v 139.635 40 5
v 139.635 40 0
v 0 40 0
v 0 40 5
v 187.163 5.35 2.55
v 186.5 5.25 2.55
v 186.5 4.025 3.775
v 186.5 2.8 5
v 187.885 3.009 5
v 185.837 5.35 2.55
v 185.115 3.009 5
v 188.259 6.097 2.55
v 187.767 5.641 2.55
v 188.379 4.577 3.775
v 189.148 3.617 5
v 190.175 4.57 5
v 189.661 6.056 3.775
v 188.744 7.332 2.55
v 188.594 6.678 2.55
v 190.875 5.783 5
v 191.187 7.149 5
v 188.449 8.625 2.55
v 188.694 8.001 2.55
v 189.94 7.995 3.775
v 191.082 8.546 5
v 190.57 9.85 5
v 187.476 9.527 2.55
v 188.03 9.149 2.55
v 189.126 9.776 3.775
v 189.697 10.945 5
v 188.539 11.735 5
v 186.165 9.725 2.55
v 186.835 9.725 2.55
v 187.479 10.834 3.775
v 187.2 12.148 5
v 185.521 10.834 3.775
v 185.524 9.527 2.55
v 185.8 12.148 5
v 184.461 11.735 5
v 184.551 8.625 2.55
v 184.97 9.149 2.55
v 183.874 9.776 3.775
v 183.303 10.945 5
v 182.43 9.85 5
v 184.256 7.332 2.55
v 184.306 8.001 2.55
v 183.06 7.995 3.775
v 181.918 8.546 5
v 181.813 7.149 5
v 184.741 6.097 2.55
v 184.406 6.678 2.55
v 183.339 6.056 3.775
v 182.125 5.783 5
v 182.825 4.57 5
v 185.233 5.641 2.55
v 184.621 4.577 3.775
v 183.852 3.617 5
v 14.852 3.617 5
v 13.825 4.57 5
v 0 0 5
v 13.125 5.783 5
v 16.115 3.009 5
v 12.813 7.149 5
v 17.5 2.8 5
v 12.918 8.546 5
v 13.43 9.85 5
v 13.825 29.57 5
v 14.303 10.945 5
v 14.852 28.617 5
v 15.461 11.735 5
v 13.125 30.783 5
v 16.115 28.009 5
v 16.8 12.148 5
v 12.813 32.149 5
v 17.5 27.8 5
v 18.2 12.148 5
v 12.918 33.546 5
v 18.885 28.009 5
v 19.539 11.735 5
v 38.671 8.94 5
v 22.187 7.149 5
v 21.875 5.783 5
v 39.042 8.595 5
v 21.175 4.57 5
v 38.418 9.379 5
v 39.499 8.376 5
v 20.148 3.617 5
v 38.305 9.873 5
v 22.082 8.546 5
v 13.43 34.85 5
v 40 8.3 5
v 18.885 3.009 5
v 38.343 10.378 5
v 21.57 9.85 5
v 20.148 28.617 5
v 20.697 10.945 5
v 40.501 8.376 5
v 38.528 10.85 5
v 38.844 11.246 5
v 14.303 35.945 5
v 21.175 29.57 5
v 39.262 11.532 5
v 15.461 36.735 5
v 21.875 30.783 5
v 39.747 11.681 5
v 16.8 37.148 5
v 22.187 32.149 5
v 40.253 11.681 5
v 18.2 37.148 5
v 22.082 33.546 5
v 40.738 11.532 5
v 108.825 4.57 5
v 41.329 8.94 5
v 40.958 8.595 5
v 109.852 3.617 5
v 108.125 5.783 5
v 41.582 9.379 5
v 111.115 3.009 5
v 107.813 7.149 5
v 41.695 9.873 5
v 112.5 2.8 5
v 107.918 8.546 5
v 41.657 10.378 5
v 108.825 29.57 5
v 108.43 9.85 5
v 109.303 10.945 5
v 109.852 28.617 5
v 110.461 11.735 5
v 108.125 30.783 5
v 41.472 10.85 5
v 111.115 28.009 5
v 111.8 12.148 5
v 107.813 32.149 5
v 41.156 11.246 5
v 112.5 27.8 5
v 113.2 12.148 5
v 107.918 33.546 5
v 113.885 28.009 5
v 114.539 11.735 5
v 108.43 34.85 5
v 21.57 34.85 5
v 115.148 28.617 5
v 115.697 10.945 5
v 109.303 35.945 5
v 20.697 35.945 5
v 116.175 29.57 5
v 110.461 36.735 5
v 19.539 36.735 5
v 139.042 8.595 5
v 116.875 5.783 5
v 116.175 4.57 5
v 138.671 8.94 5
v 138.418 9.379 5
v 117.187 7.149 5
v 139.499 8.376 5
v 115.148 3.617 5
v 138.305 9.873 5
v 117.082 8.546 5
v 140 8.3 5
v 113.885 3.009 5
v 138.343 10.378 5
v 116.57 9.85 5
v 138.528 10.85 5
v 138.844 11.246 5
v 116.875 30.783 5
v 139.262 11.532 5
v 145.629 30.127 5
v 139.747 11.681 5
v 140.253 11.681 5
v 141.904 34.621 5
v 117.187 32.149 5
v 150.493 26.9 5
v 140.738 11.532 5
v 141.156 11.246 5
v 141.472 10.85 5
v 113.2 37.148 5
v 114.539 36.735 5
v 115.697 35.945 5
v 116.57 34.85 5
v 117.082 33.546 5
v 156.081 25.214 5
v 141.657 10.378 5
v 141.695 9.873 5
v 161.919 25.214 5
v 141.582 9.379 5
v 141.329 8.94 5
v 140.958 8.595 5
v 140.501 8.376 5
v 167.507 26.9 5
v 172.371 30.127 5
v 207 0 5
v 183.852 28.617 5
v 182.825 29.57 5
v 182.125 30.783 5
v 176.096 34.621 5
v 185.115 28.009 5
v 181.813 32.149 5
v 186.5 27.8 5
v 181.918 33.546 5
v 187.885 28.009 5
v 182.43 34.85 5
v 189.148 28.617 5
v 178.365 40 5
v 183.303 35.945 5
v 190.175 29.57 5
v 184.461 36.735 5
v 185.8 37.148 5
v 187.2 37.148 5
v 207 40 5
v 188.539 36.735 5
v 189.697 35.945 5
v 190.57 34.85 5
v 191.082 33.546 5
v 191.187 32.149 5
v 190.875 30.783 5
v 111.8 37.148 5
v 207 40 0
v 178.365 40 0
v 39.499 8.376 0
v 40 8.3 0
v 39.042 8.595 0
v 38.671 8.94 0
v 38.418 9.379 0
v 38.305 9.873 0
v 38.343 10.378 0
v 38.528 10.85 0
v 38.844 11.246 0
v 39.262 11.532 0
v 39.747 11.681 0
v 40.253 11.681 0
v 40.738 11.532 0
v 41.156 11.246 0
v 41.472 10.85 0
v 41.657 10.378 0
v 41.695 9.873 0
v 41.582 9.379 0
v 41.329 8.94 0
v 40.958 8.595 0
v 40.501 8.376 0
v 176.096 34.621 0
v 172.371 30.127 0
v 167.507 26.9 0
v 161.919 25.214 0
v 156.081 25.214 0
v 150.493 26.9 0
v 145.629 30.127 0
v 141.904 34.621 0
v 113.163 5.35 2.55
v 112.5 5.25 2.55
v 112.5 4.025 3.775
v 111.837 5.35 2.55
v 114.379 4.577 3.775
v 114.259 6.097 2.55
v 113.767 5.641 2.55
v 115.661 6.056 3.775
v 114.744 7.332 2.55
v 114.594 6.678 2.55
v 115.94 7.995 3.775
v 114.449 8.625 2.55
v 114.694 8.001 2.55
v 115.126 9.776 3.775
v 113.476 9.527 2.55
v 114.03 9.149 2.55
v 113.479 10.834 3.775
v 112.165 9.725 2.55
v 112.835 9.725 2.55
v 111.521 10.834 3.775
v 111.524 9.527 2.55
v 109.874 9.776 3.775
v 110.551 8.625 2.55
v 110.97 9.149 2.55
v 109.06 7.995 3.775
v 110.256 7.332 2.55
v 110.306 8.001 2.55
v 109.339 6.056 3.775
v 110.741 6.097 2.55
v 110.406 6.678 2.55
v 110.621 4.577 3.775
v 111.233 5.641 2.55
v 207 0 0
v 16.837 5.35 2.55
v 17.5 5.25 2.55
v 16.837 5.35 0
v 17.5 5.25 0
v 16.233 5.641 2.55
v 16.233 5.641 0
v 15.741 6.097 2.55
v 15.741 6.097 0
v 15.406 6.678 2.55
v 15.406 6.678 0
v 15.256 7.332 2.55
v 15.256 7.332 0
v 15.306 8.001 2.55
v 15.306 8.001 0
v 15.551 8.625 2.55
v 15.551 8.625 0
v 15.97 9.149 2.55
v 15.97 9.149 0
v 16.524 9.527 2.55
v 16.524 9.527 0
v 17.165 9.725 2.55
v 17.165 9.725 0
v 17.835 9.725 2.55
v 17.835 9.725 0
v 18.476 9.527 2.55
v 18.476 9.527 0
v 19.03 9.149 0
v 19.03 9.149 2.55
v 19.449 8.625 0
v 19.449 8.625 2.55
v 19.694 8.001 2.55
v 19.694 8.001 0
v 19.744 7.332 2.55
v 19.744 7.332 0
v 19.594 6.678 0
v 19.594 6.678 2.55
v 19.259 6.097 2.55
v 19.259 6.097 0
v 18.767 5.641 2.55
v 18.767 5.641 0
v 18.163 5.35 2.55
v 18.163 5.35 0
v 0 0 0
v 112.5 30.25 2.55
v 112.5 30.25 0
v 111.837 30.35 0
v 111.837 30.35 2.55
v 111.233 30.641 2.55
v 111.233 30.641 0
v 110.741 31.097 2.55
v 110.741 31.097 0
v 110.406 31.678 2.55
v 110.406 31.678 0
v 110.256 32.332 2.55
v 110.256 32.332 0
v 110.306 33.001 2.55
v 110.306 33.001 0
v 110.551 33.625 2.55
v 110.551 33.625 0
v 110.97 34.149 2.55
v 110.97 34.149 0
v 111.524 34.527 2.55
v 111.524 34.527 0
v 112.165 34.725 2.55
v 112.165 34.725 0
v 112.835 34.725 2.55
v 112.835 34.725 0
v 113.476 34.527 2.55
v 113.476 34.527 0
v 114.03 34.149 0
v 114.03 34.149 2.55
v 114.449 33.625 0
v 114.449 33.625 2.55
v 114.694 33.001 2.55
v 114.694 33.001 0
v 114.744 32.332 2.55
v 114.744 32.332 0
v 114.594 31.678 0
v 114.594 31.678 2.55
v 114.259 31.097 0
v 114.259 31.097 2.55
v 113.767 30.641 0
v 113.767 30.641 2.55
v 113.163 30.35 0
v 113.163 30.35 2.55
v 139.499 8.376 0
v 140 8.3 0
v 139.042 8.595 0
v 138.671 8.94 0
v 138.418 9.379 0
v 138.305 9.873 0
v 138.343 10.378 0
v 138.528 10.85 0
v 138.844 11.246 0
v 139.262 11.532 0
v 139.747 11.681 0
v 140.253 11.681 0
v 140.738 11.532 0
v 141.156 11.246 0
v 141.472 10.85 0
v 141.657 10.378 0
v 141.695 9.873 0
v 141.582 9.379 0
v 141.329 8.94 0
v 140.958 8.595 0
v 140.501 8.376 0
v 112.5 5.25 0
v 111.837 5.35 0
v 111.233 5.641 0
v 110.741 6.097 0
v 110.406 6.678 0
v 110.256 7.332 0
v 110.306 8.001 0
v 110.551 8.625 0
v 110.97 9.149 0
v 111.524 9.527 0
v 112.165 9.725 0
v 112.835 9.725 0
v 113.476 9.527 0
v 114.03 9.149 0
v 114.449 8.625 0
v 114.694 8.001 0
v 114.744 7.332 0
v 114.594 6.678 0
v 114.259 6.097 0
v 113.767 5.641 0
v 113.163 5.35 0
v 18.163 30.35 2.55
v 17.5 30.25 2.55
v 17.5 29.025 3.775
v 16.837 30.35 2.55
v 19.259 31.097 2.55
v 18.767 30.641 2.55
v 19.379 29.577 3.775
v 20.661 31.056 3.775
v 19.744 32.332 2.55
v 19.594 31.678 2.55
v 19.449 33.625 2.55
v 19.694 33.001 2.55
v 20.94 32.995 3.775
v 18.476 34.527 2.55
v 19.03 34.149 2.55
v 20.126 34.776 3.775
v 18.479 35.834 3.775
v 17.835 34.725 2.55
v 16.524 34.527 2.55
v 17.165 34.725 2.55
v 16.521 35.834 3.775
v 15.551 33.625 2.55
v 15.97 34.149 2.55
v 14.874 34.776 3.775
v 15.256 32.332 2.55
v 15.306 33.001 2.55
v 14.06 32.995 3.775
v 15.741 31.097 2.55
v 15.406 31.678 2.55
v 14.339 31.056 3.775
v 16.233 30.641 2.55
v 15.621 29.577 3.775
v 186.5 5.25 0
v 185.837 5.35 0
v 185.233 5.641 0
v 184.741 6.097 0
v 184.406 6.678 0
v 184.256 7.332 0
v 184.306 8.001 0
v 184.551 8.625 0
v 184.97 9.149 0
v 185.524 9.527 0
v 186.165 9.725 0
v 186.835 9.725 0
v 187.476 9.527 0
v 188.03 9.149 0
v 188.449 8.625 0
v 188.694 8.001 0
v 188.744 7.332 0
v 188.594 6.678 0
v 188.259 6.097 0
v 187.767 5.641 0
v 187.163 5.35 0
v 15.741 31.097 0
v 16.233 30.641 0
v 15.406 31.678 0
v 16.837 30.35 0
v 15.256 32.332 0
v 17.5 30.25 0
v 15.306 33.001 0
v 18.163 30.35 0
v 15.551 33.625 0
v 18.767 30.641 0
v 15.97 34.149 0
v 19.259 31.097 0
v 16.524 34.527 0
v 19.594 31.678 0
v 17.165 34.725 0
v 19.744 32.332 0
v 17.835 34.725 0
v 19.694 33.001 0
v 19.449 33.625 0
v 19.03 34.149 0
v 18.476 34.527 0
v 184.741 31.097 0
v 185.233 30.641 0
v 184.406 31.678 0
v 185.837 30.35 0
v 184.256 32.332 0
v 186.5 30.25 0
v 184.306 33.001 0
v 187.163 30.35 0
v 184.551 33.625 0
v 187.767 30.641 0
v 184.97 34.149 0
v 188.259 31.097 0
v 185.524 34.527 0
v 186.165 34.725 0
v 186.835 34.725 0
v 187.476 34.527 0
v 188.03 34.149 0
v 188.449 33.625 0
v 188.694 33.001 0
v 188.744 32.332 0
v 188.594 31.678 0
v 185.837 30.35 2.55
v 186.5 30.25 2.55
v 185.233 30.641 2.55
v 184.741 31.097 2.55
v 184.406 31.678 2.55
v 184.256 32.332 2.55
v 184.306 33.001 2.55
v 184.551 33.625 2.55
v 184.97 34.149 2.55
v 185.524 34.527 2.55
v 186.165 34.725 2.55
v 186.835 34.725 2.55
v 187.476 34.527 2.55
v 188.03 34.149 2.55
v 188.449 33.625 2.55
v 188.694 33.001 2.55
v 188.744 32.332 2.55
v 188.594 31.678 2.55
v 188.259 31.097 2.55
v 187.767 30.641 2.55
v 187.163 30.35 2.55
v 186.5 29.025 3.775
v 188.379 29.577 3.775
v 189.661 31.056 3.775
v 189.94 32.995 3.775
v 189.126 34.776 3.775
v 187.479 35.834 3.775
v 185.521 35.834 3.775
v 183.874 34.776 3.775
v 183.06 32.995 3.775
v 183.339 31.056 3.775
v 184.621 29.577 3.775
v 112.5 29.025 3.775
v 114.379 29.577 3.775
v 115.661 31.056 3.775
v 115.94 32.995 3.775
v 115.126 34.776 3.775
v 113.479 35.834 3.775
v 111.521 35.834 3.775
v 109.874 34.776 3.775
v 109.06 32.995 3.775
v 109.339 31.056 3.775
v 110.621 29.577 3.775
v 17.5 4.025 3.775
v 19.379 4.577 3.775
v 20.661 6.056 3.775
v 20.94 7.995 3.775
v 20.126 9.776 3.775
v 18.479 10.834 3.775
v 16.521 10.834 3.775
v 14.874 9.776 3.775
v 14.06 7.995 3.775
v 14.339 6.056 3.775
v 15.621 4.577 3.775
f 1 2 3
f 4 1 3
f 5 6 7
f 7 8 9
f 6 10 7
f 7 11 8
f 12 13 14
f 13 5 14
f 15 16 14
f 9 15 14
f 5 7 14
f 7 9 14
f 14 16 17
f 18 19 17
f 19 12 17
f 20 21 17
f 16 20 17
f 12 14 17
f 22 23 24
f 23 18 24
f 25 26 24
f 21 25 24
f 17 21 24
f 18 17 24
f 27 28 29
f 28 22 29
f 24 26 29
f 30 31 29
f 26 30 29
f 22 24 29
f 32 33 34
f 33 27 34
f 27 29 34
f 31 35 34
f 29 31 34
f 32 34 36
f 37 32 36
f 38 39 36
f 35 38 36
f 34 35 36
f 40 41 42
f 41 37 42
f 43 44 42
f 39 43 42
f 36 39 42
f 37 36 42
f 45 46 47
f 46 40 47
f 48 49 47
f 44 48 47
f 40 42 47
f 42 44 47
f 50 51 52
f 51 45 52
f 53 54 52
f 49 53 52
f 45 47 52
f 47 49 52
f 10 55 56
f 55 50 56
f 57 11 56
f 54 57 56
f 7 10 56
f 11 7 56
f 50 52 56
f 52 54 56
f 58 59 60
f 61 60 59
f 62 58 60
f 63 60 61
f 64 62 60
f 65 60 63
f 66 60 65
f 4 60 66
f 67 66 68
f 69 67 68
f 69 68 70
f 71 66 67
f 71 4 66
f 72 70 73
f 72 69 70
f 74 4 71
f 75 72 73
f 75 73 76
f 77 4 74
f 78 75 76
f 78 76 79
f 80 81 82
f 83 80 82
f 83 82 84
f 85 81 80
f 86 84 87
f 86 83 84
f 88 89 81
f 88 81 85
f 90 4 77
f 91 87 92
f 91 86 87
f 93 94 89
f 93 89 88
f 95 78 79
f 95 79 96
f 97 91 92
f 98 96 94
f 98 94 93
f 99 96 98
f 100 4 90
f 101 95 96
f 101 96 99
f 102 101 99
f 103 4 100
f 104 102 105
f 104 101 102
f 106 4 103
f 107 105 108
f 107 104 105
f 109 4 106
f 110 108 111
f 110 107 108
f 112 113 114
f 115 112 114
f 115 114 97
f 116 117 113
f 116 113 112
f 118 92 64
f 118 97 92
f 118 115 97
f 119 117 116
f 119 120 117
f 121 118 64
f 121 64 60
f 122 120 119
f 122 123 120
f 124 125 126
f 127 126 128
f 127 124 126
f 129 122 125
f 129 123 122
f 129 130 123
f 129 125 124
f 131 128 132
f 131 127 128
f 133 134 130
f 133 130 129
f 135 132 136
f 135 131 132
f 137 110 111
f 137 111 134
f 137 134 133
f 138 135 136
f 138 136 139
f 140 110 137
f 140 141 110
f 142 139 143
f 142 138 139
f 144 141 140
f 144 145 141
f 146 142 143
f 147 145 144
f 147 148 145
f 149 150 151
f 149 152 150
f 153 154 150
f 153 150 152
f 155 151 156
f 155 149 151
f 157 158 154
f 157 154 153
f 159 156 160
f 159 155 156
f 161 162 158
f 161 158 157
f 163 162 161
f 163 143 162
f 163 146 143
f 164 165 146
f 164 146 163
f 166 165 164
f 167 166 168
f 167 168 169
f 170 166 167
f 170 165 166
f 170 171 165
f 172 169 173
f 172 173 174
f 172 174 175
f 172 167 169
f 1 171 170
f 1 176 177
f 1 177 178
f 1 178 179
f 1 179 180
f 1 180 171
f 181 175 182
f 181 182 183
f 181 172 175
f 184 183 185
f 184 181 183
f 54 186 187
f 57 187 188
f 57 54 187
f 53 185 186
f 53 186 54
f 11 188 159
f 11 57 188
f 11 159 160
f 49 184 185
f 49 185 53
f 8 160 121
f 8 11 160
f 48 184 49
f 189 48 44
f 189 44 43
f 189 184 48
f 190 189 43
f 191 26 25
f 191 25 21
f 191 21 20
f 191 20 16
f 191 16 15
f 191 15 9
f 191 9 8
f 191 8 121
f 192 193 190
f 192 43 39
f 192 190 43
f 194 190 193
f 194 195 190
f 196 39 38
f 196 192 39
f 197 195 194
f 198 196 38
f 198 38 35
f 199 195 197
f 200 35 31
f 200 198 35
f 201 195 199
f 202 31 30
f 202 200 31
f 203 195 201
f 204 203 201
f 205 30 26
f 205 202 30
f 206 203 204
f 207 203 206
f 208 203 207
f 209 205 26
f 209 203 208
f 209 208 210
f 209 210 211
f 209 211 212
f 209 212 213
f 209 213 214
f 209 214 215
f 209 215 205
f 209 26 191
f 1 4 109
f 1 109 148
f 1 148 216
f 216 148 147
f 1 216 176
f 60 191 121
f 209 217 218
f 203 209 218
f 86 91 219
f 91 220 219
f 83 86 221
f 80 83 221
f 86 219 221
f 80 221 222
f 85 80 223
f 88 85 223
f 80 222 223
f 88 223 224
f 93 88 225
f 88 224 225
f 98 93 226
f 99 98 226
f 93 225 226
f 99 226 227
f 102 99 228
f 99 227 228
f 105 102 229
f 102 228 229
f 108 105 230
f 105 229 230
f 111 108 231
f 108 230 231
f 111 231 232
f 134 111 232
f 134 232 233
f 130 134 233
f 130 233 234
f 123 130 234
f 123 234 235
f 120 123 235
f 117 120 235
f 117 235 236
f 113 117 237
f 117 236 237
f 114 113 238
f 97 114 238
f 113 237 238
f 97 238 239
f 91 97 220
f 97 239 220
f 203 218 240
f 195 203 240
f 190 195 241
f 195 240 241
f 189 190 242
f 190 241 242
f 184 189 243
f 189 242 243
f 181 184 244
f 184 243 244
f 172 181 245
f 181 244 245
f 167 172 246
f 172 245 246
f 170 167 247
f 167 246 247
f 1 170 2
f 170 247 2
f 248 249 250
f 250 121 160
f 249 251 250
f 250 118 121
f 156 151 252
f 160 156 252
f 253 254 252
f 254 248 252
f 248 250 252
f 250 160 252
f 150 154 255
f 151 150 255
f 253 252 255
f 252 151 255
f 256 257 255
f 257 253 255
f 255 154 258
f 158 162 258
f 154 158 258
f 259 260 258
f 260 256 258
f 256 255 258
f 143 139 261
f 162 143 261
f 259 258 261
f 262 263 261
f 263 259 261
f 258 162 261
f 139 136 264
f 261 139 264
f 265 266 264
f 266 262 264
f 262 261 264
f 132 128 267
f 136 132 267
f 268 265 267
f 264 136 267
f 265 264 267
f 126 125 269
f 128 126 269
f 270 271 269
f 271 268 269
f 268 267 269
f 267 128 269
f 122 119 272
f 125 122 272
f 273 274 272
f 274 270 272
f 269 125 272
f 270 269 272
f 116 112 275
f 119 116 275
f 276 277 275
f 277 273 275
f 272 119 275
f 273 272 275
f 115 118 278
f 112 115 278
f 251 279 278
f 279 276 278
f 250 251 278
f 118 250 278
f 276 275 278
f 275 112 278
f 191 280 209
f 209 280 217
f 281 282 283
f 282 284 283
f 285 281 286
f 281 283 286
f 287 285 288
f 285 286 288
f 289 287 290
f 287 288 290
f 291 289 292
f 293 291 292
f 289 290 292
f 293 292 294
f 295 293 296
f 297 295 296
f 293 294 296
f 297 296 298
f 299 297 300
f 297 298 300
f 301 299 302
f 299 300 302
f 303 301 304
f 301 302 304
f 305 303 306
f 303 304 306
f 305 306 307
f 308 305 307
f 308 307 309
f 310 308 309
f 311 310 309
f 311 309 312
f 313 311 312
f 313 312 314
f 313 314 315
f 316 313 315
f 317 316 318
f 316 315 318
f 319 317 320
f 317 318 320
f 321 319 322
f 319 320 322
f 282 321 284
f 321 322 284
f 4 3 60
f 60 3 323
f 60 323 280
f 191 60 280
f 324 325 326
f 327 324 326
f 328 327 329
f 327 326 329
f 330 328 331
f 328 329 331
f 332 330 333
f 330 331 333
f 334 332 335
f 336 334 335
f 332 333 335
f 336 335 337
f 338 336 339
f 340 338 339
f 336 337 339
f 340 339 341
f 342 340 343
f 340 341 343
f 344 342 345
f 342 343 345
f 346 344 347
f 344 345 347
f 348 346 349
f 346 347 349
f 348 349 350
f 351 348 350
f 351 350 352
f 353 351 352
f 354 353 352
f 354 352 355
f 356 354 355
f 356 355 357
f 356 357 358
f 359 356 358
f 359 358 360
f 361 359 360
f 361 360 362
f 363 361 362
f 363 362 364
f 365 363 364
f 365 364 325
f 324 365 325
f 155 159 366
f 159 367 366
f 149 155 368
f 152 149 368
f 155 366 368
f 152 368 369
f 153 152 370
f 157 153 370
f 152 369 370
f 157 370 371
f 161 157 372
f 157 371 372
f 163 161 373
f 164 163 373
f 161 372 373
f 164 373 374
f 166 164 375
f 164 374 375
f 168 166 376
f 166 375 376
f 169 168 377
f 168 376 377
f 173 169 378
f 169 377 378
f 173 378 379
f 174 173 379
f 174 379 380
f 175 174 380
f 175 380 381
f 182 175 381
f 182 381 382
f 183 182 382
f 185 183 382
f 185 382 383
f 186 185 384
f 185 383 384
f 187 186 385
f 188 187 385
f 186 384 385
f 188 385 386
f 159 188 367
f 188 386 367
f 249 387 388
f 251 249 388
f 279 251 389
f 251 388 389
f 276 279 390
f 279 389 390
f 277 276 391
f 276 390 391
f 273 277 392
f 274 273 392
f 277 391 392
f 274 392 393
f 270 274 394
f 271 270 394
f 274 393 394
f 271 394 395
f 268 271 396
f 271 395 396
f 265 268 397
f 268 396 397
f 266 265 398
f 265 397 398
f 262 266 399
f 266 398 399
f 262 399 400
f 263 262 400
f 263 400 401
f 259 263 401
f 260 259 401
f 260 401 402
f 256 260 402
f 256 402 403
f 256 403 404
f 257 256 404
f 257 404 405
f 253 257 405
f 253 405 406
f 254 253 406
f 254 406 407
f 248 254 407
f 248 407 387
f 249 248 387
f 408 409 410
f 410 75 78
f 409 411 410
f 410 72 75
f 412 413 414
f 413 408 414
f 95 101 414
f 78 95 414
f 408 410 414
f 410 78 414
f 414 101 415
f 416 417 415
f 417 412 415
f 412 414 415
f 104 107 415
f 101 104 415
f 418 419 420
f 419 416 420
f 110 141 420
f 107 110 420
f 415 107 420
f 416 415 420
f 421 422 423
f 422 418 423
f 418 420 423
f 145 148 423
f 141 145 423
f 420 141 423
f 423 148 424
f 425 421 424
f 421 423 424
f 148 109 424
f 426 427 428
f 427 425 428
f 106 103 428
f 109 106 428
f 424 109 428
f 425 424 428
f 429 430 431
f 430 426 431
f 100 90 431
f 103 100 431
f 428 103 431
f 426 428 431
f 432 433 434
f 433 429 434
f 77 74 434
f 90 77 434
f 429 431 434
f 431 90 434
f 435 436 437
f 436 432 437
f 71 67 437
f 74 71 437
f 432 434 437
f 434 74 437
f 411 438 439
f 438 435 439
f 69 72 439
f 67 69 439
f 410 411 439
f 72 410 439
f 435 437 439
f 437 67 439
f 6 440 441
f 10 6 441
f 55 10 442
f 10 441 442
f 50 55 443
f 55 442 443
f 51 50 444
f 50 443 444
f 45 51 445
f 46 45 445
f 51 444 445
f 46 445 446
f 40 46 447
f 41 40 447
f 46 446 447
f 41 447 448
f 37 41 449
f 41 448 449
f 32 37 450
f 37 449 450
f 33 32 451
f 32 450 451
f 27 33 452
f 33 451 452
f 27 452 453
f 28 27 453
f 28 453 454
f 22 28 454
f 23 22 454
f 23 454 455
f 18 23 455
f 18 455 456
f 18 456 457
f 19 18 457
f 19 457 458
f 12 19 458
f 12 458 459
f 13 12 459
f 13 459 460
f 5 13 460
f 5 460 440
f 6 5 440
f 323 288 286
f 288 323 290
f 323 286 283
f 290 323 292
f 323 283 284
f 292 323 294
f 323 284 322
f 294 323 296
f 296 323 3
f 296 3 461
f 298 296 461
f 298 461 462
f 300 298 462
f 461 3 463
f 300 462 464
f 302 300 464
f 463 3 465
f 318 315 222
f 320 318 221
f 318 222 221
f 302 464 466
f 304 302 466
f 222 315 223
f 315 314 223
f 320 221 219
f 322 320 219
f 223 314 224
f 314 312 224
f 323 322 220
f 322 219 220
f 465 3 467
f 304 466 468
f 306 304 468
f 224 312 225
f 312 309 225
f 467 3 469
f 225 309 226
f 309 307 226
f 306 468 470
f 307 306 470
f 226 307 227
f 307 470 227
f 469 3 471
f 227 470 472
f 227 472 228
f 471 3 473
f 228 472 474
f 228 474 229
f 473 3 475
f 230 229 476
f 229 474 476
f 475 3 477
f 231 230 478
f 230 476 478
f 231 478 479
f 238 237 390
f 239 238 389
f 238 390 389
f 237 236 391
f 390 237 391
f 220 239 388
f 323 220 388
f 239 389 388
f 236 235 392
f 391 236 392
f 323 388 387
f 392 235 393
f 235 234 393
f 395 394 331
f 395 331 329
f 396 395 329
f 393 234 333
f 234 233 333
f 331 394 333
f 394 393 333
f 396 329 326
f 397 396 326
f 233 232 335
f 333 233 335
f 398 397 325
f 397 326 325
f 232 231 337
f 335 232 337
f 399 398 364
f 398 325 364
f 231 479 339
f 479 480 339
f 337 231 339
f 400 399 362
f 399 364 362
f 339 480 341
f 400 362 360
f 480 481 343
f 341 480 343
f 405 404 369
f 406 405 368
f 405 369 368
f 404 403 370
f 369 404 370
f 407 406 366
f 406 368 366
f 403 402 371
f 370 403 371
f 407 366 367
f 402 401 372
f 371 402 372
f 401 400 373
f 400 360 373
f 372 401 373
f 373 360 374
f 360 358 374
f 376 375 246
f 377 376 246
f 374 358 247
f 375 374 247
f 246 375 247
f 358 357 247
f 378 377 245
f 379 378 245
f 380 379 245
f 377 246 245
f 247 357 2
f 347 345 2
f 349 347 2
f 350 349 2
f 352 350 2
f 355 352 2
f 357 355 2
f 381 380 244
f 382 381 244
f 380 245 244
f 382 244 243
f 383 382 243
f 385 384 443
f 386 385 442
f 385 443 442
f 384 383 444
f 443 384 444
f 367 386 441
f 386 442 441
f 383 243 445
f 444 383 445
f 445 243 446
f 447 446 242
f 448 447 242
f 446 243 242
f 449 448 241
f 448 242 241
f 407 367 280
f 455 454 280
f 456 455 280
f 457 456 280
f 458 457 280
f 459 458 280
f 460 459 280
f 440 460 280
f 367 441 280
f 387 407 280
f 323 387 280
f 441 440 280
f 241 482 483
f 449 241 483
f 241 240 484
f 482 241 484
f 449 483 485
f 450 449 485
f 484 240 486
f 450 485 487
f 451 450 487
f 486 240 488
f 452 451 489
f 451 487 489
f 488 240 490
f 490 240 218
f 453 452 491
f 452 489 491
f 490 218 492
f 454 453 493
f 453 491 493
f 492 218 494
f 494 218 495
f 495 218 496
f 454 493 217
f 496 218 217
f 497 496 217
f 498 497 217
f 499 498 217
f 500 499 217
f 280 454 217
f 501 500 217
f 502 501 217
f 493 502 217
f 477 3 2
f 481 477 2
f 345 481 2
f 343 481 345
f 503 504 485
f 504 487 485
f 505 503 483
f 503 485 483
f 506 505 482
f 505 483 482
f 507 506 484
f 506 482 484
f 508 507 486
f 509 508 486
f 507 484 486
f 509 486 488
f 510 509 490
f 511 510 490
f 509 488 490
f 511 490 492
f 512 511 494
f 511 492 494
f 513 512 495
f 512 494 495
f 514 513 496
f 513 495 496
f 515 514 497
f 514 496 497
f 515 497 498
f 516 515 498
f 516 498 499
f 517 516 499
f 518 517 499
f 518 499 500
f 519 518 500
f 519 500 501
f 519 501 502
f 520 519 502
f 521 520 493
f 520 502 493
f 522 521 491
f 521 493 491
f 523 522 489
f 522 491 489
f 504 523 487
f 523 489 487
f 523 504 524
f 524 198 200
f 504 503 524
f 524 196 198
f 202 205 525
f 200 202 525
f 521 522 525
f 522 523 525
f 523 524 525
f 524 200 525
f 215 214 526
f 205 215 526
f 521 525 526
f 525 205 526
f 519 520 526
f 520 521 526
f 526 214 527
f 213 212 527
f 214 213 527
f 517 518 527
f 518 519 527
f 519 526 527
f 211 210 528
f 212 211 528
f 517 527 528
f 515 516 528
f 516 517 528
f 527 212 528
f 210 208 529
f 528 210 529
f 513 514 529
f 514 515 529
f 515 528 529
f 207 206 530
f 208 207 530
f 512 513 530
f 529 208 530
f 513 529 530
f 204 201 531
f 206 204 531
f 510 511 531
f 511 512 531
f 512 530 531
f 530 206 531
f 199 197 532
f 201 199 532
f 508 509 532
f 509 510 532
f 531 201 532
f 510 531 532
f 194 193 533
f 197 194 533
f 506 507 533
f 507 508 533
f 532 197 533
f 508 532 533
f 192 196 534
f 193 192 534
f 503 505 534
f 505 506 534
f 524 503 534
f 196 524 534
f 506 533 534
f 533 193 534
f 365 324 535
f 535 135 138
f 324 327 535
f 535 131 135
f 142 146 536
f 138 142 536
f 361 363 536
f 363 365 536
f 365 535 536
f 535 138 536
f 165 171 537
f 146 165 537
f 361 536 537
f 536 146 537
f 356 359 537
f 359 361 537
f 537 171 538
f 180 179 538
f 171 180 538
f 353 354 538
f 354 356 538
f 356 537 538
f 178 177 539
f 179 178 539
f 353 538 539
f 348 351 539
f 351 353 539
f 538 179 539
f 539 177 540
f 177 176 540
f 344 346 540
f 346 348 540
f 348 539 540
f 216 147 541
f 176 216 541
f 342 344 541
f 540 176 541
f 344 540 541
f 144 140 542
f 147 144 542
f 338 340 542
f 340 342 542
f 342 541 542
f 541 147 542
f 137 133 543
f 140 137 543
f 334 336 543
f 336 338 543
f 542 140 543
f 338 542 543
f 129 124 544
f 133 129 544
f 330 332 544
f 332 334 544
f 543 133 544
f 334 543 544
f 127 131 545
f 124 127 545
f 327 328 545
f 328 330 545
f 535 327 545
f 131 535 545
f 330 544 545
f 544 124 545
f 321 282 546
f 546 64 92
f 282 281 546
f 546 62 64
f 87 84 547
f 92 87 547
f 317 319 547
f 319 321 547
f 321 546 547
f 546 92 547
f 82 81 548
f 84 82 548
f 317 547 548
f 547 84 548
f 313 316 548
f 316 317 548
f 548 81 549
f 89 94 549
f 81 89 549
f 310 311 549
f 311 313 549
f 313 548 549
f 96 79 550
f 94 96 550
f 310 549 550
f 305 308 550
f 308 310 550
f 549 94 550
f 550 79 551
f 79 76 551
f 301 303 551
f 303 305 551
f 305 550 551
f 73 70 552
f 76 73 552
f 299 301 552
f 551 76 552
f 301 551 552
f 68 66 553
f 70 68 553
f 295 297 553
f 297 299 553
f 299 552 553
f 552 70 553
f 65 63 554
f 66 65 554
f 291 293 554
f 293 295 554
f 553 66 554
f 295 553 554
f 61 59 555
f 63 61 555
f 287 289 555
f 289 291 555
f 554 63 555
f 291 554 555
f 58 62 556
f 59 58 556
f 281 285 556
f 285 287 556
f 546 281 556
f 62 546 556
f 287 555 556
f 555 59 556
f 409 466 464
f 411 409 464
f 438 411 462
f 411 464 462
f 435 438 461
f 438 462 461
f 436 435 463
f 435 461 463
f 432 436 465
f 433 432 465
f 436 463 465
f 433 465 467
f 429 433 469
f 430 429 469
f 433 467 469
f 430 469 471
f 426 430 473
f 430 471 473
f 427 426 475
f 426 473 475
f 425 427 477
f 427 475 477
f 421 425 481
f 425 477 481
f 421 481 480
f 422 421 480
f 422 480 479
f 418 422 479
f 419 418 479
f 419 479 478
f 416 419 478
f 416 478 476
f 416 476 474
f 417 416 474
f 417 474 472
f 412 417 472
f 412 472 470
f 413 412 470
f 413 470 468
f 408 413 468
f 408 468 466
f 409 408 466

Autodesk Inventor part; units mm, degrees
ref_plane "YZ Plane" through (0, 0, 0) normal (1, 0, 0) x (0, 1, 0)
ref_plane "XZ Plane" through (0, 0, 0) normal (0, 1, 0) x (-1, 0, 0)
ref_plane "XY Plane" through (0, 0, 0) normal (0, 0, 1) x (1, 0, 0)
sketch "Sketch1" plane through (0, 0, 0) normal (0, 0, 1) x (1, 0, 0)
  line L0 (0, 0) -> (207, 0)
  line L1 (207, 0) -> (207, 40)
  line L2 (207, 40) -> (0, 40)
  line L3 (0, 40) -> (0, 0)
  dimension "d0" = 207
  dimension "d1" = 40
extrude "Extrusion1" add sketch "Sketch1" along normal blind 5
sketch "Sketch2" plane through (0, 0, 5) normal (0, 0, 1) x (1, 0, 0)
  line L0 (207, 40) -> (0, 40) projected
  line L1 (0, 0) -> (207, 0) projected
  line L2 (0, 40) -> (0, 0) projected
  point P0 (17.5, 32.5)
  point P1 (17.5, 7.5)
  point P2 (112.5, 32.5)
  point P3 (112.5, 7.5)
  point P4 (186.5, 32.5)
  point P5 (186.5, 7.5)
  dimension "d4" = 7.5
  dimension "d5" = 7.5
  dimension "d6" = 17.5
  dimension "d7" = 95
  dimension "d8" = 74
hole "Hole1" at (17.5, 32.5, 5) at (17.5, 7.5, 5) at (112.5, 32.5, 5) at (112.5, 7.5, 5) at (186.5, 32.5, 5) at (186.5, 7.5, 5) direction (0, 0, -1) diameter 4.5 end through all countersink diameter 9.4 countersink angle 90 clearance for "Flat Head Machine Screw" size "M4" standard "Ansi Metric M Profile"
sketch "Sketch3" plane through (0, 0, 5) normal (0, 0, 1) x (1, 0, 0)
  line L0 (0, 40) -> (0, 0) projected
  line L1 (0, 0) -> (207, 0) projected
  circle A0 centre (186.5, 7.5) radius 4.7 projected
  point P0 (159, 45)
  dimension "d17" = 45
  dimension "d25" = 27.5
hole "Hole2" at (159, 45, 5) direction (0, 0, -1) diameter 40 end through all
sketch "Sketch4" plane through (0, 0, 5) normal (0, 0, 1) x (1, 0, 0)
  line L0 (0, 0) -> (207, 0) projected
  line L1 (0, 40) -> (0, 0) projected
  point P0 (40, 10)
  point P1 (140, 10)
  dimension "d26" = 10
  dimension "d27" = 100
  dimension "d28" = 40
hole "Hole3" at (40, 10, 5) at (140, 10, 5) direction (0, 0, -1) diameter 3.4 end through all clearance for "Flat Head Machine Screw" size "M3" standard "Ansi Metric M Profile"
equation "\"d5\" = d4"
properties part number "Top_Slider Piece 2" material "Wood (Oak)"
